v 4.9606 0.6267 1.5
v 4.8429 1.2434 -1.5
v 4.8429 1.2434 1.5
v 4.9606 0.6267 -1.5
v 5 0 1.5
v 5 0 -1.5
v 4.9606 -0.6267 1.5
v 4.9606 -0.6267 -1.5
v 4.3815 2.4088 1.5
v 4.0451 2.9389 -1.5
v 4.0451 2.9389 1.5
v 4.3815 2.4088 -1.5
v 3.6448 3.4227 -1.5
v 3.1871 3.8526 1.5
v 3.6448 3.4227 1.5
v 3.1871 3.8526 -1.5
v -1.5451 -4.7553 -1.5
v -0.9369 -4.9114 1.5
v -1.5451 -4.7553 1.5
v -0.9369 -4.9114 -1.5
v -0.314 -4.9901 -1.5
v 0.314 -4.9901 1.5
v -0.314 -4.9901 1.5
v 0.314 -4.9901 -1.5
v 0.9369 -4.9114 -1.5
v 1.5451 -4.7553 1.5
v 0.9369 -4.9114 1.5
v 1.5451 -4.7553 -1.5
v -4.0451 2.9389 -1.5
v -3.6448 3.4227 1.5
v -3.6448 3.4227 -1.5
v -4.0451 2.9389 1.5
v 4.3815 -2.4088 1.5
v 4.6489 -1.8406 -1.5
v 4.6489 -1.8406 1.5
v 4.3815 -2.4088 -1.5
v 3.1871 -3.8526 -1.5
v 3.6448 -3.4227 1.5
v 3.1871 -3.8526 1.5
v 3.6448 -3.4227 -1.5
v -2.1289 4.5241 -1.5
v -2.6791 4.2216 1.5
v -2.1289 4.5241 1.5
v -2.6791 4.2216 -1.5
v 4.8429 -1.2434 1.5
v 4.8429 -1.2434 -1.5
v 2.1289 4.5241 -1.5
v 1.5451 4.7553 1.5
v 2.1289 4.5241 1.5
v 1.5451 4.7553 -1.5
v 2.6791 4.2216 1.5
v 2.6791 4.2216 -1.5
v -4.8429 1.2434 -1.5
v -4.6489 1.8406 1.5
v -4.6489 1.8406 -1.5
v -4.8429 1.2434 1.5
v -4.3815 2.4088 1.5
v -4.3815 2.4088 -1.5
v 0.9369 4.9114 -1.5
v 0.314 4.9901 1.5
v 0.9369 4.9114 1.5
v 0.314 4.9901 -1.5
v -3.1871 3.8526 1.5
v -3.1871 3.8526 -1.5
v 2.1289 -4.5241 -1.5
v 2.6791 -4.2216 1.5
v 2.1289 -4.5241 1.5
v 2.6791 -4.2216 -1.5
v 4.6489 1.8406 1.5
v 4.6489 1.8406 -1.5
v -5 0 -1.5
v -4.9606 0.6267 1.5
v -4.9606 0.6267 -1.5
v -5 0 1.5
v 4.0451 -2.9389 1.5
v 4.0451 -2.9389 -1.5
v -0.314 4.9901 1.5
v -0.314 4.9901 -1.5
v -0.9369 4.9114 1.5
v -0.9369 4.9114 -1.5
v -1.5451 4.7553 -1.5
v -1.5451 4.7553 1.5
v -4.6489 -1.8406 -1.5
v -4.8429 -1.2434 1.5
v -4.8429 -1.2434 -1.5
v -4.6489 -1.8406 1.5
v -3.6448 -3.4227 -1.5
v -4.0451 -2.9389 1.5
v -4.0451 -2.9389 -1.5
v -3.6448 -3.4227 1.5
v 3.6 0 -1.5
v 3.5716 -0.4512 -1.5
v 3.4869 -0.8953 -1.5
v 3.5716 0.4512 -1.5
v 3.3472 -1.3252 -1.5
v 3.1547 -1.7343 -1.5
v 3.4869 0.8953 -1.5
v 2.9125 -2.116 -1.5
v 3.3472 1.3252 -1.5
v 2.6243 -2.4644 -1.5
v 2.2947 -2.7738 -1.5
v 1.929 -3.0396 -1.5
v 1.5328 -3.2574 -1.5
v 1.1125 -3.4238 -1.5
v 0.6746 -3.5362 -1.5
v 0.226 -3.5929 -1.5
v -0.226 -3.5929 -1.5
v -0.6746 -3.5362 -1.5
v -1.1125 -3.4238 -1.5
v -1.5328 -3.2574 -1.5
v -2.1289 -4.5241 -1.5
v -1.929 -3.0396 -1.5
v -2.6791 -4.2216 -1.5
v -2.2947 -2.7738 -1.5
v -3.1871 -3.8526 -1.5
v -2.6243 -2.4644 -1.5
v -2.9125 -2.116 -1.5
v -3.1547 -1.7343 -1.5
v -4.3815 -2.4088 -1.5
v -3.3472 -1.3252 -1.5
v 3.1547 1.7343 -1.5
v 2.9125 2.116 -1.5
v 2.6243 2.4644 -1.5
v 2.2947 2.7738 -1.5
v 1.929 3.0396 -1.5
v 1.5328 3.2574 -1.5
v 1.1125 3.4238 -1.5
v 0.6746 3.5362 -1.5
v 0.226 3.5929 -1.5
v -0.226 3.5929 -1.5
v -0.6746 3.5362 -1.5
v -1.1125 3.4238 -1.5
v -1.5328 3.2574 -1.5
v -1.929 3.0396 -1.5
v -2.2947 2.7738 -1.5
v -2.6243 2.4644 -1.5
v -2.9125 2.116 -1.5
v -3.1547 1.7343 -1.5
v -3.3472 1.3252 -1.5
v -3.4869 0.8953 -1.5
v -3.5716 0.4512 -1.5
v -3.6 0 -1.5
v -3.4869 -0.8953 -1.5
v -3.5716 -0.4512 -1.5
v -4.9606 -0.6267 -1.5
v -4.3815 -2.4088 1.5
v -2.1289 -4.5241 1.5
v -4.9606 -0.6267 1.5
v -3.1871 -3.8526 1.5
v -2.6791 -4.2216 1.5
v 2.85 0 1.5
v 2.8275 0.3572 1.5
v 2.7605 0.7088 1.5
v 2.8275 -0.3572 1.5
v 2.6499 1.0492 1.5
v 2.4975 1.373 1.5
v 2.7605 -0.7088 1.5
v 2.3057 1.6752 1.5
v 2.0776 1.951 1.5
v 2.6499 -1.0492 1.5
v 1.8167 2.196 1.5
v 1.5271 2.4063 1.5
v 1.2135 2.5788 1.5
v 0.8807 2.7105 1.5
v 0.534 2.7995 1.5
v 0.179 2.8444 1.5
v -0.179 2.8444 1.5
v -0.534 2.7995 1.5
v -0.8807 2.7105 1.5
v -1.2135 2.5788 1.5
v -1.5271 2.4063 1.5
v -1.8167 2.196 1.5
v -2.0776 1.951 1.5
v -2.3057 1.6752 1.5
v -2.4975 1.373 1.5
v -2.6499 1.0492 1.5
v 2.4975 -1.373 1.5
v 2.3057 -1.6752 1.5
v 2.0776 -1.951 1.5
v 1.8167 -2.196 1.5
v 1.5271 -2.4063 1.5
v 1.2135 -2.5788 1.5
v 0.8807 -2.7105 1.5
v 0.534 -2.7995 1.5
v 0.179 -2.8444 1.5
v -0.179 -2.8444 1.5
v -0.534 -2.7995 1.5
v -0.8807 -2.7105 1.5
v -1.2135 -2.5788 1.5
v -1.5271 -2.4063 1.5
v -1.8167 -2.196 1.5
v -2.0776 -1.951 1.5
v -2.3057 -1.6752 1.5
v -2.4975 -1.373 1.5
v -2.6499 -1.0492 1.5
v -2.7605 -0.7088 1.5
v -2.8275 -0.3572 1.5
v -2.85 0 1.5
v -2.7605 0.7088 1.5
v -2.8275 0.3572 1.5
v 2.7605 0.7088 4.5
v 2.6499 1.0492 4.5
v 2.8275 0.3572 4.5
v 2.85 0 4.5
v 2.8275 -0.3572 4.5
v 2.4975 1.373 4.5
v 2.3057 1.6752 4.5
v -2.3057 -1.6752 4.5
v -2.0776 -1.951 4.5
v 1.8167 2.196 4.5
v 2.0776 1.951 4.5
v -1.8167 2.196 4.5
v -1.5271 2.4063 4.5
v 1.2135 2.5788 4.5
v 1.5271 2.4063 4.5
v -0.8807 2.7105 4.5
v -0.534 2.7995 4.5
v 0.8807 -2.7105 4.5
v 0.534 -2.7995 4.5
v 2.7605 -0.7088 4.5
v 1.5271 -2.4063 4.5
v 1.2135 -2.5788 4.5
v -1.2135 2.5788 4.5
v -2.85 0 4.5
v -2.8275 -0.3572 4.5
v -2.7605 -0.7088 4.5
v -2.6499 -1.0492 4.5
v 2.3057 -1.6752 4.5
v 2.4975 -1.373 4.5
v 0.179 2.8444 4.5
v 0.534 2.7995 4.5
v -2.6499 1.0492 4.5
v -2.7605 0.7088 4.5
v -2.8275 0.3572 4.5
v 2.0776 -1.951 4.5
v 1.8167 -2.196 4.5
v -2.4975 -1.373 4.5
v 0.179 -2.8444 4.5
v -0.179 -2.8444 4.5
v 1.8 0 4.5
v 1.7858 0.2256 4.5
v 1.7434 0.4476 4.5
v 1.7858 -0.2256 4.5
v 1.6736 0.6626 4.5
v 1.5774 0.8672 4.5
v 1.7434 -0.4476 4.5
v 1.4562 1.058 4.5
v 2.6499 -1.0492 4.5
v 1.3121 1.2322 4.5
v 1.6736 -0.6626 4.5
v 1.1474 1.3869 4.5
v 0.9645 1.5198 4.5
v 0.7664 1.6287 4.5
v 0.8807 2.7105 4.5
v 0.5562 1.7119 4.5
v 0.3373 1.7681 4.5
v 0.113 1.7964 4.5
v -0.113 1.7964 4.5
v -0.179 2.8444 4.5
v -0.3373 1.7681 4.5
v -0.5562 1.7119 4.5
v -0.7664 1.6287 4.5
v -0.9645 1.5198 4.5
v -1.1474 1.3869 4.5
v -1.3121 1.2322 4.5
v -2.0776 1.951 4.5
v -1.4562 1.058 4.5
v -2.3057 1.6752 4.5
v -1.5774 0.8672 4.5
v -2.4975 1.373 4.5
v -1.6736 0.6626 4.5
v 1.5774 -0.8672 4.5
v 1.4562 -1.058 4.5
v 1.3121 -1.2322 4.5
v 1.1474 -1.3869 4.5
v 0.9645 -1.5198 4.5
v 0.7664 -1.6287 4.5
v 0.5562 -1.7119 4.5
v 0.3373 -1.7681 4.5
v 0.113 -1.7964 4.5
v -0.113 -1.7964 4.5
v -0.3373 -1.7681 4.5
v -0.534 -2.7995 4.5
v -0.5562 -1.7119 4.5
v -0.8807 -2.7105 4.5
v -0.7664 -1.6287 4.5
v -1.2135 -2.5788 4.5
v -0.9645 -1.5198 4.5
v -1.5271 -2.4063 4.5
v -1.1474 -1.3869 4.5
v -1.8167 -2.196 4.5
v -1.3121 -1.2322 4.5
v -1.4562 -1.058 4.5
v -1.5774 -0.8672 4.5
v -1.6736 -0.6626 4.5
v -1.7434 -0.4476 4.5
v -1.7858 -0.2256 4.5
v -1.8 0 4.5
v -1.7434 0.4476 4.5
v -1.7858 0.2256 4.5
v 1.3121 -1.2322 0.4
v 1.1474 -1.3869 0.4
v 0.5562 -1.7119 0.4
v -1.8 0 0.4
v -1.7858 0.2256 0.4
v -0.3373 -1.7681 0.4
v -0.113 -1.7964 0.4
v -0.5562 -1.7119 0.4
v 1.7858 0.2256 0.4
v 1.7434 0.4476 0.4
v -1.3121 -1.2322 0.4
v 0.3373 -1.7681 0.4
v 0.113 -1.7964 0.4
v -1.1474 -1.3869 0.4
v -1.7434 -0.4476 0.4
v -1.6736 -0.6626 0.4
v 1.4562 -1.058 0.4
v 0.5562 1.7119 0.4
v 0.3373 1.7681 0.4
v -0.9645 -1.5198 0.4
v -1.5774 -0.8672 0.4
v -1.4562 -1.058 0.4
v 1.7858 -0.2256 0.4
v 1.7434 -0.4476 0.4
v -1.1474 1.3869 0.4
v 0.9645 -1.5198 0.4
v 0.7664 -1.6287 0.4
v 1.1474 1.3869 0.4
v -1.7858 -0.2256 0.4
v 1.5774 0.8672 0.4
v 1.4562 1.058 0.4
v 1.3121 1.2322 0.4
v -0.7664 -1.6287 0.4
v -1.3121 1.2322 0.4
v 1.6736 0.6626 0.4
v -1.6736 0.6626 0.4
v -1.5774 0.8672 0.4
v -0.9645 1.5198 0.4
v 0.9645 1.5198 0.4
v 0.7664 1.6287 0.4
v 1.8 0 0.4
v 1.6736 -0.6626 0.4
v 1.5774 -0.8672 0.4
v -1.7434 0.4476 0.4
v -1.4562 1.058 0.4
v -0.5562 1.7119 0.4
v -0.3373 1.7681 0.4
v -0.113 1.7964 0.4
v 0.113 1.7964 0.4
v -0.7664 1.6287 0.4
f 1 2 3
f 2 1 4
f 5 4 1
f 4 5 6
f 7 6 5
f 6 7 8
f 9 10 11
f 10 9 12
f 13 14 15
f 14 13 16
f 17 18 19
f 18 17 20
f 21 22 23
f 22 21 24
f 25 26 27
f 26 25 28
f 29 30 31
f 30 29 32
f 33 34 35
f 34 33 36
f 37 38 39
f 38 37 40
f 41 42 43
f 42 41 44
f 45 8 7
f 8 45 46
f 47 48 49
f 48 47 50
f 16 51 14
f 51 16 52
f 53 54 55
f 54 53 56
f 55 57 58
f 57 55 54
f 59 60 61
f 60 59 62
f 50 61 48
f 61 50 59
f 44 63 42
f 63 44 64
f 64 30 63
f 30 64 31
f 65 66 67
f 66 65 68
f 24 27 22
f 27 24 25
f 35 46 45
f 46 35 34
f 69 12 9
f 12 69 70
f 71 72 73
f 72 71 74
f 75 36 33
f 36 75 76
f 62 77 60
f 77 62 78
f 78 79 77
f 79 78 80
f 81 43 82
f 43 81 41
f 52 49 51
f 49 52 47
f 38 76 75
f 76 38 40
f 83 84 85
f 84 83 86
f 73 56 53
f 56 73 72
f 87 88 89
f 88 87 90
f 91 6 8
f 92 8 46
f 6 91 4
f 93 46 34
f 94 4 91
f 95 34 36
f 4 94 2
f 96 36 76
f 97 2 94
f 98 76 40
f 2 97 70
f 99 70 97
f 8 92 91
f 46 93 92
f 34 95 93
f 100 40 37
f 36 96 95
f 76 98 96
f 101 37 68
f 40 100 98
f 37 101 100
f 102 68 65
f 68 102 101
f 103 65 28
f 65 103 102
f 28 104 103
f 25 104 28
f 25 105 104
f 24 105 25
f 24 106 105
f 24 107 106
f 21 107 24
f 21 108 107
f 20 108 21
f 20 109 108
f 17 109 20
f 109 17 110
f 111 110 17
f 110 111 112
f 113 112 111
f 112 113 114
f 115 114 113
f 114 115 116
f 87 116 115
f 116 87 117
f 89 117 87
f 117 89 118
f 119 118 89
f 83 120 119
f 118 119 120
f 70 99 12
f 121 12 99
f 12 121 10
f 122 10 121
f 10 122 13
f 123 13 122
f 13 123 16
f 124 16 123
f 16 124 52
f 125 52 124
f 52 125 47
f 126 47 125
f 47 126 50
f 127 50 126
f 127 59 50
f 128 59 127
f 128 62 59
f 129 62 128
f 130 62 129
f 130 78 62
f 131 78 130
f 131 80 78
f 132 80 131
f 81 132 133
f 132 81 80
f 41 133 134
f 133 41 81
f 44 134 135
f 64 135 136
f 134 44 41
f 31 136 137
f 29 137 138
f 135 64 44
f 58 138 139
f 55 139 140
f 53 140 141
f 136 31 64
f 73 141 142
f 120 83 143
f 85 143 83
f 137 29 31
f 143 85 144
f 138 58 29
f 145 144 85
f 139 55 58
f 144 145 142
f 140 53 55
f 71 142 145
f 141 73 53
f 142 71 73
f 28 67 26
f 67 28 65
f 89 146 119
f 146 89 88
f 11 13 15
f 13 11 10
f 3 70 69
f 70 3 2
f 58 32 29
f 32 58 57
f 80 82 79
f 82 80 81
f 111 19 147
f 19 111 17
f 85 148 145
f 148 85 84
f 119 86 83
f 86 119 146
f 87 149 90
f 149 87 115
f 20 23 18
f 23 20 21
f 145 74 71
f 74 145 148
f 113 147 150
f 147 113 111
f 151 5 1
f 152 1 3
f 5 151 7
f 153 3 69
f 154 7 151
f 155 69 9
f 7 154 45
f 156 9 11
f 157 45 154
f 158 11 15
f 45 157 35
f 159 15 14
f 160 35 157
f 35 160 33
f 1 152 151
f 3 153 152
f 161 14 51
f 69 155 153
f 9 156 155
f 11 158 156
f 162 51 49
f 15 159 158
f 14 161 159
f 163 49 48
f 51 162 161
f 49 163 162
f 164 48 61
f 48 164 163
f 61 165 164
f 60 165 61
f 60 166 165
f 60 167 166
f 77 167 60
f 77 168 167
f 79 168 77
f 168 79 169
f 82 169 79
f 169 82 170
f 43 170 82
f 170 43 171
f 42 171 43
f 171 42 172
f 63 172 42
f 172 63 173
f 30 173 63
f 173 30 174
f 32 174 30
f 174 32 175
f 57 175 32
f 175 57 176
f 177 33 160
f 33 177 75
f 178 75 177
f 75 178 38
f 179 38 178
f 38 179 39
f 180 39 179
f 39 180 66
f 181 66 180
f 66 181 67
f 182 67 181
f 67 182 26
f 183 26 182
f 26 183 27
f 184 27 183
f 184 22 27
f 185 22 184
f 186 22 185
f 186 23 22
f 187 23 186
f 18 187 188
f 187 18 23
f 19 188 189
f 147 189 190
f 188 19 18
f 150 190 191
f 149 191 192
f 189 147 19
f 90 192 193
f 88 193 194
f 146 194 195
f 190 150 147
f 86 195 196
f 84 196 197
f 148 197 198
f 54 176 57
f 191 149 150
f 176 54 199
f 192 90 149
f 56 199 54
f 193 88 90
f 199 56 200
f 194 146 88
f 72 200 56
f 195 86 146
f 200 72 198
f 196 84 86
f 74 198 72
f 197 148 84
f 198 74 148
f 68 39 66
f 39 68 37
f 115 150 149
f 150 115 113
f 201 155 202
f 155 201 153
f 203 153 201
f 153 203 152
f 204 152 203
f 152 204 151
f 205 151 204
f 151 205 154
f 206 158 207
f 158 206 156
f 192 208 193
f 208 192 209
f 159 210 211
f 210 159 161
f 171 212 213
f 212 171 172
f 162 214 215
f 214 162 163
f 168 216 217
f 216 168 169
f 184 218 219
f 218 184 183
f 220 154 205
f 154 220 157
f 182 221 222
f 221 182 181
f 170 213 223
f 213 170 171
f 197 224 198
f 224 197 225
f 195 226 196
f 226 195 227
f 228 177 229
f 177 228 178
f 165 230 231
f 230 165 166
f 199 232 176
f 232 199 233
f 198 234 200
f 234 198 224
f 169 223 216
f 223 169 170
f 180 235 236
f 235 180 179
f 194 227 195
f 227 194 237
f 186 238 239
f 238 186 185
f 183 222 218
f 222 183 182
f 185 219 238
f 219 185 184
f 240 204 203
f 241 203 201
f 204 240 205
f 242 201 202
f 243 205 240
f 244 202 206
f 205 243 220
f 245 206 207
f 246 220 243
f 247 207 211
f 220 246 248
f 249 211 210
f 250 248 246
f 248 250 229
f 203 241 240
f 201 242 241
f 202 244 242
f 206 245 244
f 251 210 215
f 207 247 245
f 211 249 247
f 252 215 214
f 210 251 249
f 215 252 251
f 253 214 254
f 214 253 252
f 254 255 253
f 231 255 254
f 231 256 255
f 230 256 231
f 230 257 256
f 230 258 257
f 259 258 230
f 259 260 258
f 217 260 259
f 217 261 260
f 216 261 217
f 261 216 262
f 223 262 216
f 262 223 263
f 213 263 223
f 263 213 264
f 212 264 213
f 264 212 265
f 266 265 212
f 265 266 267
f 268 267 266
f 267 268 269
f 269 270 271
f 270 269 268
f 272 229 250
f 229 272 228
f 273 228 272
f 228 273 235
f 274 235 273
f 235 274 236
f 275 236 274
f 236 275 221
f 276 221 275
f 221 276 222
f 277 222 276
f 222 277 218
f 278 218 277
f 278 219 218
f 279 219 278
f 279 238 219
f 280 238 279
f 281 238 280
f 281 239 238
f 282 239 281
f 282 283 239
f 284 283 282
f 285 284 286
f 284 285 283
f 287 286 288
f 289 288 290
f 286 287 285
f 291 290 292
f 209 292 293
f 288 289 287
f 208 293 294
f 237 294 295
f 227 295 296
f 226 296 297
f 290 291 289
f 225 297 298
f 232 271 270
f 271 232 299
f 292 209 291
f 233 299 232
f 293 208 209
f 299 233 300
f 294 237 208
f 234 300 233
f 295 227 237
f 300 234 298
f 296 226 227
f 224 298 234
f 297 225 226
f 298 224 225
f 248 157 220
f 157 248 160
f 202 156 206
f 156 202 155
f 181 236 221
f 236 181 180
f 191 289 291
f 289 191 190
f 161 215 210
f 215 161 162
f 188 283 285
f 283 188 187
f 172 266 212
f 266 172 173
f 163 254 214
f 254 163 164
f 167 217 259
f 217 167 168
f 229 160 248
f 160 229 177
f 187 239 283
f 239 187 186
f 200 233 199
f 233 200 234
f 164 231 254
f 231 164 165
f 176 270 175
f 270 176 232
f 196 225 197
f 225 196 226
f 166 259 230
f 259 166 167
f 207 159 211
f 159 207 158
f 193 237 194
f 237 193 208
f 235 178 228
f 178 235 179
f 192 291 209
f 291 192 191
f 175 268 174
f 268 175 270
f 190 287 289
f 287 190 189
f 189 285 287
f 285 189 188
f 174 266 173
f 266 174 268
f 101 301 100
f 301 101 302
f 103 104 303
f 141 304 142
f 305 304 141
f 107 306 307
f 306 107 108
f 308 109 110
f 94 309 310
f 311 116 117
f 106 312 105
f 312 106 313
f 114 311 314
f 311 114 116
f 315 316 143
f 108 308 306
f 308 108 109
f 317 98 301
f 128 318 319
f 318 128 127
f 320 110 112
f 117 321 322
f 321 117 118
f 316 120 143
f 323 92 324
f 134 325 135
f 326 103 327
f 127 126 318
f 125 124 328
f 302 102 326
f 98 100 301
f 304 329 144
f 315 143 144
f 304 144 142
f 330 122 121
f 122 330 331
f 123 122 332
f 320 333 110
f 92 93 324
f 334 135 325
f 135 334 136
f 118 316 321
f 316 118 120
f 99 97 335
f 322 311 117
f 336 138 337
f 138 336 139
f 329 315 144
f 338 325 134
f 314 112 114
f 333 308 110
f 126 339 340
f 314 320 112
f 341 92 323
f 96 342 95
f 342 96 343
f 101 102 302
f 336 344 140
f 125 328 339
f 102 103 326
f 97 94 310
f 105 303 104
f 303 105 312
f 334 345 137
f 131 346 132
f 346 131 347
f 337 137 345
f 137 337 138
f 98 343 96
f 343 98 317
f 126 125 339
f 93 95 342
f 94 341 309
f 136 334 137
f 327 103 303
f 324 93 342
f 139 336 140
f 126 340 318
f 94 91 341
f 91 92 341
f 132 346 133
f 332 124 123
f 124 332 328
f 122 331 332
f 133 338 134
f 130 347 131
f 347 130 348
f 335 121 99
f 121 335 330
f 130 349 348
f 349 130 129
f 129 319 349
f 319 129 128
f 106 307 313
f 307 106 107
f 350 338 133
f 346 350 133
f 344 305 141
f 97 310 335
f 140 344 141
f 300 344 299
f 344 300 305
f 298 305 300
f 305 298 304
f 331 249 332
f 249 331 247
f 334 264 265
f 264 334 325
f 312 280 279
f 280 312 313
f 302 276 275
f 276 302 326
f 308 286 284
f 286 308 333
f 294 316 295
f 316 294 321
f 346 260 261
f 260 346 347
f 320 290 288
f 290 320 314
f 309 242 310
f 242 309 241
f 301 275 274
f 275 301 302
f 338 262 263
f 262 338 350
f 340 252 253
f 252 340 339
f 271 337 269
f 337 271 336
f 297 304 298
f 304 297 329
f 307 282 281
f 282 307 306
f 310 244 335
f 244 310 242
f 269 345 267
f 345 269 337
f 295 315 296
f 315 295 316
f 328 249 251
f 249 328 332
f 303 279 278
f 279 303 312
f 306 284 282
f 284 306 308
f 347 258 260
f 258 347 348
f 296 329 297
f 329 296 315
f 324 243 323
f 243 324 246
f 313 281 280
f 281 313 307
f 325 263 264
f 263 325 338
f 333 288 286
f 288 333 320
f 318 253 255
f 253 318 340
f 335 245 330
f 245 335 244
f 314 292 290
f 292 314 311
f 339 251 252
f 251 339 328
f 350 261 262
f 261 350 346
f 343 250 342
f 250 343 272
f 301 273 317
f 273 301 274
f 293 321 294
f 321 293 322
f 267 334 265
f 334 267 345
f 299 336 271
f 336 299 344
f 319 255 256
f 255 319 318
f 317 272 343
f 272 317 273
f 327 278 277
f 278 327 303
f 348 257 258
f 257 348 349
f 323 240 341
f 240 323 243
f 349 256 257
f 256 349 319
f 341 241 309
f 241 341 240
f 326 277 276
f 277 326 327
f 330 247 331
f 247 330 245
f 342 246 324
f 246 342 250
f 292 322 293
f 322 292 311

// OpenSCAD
$fn = 50;


difference() {
	union() {
		translate(v = [0, 0, -1.5000000000]) {
			cylinder(h = 3, r = 5.0000000000);
		}
		translate(v = [0, 0, -1.5000000000]) {
			cylinder(h = 6, r = 2.8500000000);
		}
	}
	union() {
		translate(v = [0, 0, -1.5000000000]) {
			rotate(a = [0, 180, 0]) {
				difference() {
					union() {
						translate(v = [0, 0, -6.0000000000]) {
							cylinder(h = 6, r = 1.5000000000);
						}
						translate(v = [0, 0, -1.9000000000]) {
							cylinder(h = 1.9000000000, r1 = 1.8000000000, r2 = 3.6000000000);
						}
						translate(v = [0, 0, -6.0000000000]) {
							cylinder(h = 6, r = 1.8000000000);
						}
						translate(v = [0, 0, -6.0000000000]) {
							cylinder(h = 6, r = 1.5000000000);
						}
					}
					union();
				}
			}
		}
		translate(v = [0, 0, -100.0000000000]) {
			cylinder(h = 200, r = 1.8000000000);
		}
	}
}
